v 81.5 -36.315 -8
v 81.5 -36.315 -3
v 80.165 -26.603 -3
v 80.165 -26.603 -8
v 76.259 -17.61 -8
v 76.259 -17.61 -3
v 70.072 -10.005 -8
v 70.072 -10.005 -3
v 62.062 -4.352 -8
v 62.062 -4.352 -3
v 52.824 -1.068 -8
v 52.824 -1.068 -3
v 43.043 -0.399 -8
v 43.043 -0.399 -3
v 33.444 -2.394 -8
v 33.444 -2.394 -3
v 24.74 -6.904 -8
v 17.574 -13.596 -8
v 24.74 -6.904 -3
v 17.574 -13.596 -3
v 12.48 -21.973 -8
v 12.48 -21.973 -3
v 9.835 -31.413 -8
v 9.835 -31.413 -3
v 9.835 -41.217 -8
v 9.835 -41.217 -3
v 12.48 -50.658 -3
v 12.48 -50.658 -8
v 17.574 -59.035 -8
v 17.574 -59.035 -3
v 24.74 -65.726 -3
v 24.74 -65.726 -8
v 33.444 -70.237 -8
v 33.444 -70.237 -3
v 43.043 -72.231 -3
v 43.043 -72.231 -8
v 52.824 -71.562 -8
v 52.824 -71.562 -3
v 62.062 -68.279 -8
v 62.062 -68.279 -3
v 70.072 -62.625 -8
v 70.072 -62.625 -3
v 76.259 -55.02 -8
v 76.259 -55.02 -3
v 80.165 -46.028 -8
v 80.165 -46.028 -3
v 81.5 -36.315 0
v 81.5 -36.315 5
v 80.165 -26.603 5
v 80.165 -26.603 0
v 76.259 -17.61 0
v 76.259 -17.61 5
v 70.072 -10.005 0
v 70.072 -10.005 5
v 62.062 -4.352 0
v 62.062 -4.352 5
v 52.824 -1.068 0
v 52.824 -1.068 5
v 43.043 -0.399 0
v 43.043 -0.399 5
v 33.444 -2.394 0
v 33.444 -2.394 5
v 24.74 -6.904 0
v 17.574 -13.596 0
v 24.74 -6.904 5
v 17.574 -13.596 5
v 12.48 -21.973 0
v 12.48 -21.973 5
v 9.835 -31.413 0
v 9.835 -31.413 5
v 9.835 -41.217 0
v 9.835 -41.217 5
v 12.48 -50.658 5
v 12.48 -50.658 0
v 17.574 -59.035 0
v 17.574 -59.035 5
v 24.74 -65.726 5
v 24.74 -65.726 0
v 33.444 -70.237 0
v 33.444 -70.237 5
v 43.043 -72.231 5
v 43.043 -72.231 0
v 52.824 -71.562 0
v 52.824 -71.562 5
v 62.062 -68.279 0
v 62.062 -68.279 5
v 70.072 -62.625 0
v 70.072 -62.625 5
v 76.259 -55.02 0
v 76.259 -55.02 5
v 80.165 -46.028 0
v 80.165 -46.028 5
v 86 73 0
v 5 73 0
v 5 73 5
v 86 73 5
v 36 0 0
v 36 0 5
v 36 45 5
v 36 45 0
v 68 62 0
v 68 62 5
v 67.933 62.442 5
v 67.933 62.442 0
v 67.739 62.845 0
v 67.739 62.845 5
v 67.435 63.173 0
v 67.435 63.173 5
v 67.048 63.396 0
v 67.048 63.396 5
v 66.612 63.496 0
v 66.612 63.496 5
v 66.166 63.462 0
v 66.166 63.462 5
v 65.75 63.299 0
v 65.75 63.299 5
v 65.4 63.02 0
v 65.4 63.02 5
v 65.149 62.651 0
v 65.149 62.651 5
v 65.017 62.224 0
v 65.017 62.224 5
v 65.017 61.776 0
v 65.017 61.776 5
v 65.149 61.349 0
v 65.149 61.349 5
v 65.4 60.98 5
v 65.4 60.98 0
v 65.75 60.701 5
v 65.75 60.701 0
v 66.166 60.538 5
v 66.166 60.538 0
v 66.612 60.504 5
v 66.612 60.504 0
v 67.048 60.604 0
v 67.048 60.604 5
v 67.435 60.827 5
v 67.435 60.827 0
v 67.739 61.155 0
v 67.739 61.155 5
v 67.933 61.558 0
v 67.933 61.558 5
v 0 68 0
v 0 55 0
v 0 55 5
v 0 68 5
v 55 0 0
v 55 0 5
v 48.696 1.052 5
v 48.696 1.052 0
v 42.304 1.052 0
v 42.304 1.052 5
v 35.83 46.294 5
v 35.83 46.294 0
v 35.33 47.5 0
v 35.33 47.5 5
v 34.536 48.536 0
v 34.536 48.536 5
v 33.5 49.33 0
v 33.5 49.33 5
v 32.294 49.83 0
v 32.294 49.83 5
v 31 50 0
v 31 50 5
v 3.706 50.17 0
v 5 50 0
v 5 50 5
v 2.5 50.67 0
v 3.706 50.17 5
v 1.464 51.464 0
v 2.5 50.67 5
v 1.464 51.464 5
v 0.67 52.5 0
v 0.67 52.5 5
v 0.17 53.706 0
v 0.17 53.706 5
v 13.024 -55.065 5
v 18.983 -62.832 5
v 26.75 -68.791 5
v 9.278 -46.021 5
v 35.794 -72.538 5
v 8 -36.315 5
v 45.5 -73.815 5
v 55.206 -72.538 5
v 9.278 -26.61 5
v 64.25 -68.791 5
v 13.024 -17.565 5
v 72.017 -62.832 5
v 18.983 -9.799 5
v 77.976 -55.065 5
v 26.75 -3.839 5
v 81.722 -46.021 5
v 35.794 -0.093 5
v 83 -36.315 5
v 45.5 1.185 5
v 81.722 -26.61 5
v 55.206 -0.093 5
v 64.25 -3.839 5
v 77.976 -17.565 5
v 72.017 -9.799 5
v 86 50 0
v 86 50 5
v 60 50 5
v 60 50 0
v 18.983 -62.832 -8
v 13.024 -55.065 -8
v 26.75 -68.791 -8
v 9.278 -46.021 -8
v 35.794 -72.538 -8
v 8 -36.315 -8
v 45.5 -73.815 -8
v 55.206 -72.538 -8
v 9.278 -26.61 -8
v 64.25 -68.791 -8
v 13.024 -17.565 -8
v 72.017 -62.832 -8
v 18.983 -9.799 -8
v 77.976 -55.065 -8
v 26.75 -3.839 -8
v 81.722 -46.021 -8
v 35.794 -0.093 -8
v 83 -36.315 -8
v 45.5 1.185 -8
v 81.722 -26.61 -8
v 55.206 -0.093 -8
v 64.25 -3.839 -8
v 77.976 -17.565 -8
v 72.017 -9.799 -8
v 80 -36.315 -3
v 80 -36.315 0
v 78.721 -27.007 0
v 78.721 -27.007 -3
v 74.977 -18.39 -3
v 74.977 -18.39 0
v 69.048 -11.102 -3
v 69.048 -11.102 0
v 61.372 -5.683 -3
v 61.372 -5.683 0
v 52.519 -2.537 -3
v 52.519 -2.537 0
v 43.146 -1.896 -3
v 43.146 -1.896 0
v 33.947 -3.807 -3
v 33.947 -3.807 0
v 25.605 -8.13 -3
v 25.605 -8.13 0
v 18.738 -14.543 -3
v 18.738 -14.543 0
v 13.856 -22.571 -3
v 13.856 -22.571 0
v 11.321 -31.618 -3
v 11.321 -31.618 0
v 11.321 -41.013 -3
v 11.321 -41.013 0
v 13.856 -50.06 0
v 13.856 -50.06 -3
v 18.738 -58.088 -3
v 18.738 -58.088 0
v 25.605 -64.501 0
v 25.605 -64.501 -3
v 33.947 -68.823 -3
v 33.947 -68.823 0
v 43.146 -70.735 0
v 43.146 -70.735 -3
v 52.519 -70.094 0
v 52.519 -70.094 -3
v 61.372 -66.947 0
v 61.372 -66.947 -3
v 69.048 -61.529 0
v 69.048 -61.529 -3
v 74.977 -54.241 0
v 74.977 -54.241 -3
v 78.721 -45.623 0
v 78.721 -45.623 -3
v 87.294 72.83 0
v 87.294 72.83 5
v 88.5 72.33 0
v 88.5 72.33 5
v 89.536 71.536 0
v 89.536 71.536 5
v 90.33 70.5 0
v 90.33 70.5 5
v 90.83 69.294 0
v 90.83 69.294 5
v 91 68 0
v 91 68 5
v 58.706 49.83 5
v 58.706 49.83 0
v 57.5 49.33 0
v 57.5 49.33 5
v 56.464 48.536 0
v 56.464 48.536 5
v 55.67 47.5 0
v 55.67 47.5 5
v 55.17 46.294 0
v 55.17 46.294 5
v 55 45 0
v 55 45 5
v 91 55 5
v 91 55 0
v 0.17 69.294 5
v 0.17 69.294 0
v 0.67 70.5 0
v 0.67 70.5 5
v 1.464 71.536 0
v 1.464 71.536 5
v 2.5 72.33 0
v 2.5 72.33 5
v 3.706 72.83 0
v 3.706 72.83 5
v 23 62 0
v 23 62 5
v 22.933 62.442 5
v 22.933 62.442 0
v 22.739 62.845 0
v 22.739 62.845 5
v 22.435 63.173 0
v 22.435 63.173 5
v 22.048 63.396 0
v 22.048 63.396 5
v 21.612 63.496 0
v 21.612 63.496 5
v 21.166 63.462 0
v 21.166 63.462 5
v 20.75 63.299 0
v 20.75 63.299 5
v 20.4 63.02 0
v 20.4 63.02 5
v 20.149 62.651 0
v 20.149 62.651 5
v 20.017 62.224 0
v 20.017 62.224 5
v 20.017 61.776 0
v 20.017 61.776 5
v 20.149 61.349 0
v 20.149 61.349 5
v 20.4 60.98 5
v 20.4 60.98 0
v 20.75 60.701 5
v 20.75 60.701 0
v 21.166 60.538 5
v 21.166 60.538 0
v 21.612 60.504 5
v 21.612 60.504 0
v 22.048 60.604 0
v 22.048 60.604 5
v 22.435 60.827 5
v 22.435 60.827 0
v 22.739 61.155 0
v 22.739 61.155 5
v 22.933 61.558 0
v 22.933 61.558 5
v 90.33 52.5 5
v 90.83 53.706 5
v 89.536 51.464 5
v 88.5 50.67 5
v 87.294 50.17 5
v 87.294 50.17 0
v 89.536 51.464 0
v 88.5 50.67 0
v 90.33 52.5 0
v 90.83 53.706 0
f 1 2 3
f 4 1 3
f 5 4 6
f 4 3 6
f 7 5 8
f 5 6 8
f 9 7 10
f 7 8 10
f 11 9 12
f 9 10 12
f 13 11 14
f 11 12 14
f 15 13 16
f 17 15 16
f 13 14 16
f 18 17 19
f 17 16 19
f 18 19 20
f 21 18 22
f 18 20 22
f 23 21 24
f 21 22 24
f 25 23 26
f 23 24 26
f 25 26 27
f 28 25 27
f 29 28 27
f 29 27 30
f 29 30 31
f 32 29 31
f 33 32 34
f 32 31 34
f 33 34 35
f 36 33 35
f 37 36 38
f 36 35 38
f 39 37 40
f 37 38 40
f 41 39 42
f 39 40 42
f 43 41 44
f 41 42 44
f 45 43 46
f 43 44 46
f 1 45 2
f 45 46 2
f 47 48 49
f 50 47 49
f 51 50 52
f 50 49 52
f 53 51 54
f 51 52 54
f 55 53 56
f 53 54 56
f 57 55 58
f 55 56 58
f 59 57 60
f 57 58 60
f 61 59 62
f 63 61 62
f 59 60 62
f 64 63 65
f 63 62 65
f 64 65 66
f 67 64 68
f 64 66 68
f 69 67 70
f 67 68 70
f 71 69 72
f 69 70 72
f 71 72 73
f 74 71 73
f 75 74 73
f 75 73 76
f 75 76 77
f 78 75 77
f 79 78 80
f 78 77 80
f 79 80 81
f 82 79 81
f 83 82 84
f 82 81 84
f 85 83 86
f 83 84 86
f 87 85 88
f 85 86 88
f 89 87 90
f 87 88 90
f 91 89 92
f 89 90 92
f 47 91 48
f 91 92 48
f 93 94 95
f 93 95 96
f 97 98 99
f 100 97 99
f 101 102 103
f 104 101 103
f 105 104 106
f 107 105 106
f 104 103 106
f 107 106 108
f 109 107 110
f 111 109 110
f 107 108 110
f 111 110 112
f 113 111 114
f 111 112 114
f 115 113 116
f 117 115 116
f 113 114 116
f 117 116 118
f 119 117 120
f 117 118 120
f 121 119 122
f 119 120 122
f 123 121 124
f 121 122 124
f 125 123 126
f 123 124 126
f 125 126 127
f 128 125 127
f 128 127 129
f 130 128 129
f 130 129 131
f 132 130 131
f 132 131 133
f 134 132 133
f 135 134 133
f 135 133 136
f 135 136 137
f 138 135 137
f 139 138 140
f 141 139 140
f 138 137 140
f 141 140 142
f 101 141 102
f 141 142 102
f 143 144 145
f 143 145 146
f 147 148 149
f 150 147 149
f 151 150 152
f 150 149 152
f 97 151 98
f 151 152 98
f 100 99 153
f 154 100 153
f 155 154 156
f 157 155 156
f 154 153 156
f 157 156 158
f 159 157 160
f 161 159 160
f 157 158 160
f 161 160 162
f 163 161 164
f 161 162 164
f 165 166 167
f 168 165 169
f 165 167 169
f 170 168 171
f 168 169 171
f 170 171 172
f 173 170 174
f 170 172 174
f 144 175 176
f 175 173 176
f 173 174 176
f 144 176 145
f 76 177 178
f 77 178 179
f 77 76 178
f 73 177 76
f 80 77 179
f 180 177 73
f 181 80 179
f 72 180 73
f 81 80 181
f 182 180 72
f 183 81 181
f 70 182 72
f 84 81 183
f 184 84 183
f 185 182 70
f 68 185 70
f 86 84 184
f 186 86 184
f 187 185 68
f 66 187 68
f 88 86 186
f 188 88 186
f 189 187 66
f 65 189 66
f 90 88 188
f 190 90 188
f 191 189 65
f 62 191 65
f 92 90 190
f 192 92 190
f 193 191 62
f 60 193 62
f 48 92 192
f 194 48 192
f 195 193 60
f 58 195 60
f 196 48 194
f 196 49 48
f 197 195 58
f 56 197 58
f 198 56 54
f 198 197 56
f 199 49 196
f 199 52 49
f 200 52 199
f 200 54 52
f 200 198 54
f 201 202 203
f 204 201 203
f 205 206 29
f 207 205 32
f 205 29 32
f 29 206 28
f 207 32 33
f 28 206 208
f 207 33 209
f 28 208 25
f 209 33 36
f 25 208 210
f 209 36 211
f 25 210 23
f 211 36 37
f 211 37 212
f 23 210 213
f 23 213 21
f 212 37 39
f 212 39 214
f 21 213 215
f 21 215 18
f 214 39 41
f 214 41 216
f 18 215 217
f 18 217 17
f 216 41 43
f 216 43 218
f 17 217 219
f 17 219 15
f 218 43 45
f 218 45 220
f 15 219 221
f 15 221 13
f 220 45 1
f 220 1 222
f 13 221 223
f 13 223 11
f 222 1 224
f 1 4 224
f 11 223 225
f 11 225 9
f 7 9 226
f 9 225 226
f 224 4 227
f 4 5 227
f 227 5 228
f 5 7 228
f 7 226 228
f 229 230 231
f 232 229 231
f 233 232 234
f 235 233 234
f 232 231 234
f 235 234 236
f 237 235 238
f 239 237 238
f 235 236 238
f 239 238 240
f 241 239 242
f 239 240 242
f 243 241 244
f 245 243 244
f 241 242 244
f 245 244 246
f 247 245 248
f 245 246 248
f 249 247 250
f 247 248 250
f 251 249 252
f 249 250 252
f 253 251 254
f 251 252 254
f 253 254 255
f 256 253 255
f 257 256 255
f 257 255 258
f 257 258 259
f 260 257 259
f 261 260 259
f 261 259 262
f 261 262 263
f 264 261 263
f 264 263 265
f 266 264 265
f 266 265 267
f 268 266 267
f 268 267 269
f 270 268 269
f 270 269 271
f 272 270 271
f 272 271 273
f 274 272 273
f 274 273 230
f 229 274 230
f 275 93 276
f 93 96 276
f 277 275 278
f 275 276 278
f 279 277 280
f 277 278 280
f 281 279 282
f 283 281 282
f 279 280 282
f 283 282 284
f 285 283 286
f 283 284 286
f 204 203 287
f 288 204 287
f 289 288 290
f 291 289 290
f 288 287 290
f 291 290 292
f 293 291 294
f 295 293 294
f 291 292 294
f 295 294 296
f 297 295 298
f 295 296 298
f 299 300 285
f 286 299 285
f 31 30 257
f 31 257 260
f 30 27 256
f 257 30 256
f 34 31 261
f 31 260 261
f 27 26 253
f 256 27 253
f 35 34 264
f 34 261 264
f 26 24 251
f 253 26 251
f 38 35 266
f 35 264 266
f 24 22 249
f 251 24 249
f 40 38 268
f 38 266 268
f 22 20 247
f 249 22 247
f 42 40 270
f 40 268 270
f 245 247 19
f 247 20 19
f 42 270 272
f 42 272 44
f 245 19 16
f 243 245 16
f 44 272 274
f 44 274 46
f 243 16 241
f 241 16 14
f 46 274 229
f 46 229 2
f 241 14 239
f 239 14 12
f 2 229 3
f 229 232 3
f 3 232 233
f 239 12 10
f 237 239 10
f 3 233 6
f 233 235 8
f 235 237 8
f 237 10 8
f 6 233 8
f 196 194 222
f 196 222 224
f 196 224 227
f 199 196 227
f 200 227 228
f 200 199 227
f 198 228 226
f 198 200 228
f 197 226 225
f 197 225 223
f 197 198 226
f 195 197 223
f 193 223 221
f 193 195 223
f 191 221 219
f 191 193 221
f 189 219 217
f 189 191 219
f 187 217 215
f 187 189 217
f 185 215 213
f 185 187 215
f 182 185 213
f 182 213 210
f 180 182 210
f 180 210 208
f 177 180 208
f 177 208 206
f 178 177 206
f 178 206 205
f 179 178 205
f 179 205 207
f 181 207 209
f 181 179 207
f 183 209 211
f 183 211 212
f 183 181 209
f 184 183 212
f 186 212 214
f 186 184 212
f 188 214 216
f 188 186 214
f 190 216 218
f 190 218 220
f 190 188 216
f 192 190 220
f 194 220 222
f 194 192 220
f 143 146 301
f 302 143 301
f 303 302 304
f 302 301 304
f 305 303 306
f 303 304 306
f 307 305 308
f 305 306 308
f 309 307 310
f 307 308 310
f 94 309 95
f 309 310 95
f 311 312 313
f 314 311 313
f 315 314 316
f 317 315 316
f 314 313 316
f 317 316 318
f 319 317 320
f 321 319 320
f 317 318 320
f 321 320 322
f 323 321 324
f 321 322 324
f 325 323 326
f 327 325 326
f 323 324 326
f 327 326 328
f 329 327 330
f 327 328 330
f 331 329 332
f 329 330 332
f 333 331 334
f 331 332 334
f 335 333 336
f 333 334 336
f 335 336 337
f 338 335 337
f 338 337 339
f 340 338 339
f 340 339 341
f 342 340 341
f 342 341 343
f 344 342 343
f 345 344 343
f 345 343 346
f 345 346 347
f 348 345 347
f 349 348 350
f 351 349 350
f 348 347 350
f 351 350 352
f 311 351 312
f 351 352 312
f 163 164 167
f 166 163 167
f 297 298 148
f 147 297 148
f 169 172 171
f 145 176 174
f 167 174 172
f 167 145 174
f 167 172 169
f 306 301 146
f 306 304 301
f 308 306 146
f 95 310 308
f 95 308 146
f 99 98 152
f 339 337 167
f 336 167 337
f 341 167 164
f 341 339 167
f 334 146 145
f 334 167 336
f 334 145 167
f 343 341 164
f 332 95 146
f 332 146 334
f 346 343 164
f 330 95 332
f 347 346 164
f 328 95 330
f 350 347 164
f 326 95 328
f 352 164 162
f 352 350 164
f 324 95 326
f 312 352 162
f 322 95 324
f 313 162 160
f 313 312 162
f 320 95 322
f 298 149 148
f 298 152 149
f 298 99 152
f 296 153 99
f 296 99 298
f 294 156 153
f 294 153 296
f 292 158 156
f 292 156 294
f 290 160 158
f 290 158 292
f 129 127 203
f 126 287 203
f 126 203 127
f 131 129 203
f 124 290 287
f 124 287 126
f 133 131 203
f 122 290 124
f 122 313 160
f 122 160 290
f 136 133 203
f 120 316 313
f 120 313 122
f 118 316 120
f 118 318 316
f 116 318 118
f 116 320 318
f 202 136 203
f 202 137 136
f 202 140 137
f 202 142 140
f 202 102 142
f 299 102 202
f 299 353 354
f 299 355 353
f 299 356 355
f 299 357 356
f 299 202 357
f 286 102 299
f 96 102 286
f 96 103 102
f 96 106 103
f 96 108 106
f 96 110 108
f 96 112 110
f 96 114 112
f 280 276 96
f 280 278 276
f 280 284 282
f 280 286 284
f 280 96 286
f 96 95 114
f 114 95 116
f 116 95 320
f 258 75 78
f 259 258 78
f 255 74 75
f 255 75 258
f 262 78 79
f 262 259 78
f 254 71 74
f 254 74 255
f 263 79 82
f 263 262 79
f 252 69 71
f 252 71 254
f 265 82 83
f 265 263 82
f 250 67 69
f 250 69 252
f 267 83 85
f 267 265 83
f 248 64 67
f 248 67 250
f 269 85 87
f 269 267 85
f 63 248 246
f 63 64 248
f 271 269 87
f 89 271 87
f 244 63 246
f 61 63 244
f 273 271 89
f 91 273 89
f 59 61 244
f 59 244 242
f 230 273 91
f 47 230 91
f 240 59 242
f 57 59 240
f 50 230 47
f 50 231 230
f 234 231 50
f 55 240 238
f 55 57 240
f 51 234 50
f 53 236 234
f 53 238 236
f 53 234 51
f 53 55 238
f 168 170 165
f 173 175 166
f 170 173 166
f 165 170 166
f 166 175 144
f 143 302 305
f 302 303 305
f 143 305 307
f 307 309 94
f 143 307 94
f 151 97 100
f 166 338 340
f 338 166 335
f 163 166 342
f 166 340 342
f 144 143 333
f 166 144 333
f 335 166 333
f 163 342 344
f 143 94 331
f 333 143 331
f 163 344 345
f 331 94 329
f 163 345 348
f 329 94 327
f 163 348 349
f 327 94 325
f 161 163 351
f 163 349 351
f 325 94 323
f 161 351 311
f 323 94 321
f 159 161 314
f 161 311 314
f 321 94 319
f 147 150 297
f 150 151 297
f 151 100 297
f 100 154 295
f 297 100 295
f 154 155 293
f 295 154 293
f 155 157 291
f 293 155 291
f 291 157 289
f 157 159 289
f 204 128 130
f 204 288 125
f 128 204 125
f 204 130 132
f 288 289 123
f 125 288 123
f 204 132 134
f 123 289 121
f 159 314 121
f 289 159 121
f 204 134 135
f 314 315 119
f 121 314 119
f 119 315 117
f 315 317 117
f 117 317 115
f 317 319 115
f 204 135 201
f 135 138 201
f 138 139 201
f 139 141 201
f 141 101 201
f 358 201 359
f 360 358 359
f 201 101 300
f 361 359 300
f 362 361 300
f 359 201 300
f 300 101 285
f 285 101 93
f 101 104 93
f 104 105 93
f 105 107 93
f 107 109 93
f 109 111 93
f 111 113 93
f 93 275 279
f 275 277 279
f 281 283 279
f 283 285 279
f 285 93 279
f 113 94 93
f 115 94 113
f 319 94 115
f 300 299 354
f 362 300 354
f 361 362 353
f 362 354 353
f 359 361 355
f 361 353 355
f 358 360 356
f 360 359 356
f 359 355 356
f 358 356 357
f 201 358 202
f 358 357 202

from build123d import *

# Parameters (mm, degrees)
ESQUISSE1_W                = 91
ESQUISSE1_H                = 73
BOSS_EXTRU_1_DEPTH         = 5
ENL_V_MAT_EXTRU_2_DEPTH    = 10
ENL_V_MAT_EXTRU_3_DEPTH    = 10
ESQUISSE4_R                = 37.5
BOSS_EXTRU_2_DEPTH         = 13
ESQUISSE5_R                = 36
ENL_V_MAT_EXTRU_4_DEPTH    = 5
R_P_TITION_LIN_AIRE1_COUNT = 2
R_P_TITION_LIN_AIRE1_PITCH = 8
ESQUISSE6_R                = 34.5
ENL_V_MAT_EXTRU_5_DEPTH    = 5
ENL_V_MAT_EXTRU_6_DEPTH    = 5
CONG_1_R                   = 5
ESQUISSE8_R                = 1.5
ENL_V_MAT_EXTRU_7_DEPTH    = 5


with BuildPart() as part:
    # Esquisse1 → Boss.-Extru.1 (new body)
    with BuildSketch(Plane.XY):
        with Locations((45.5, 36.5)):
            Rectangle(ESQUISSE1_W, ESQUISSE1_H)
    extrude(amount=BOSS_EXTRU_1_DEPTH)

    # Esquisse2 → Enlèv. mat.-Extru.2 (cut)
    with BuildSketch(Plane.XY.offset(5)):
        with BuildLine():
            Line((0, 0), (36, 0))
            Line((36, 0), (36, 45))
            ThreePointArc((36, 45), (34.535533906, 48.535533906), (31, 50))
            Line((31, 50), (5, 50))
            ThreePointArc((5, 50), (1.464466094, 51.464466094), (0, 55))
            Line((0, 55), (0, 50))
            Line((0, 50), (0, 0))
        make_face()
        with BuildLine():
            Line((86, 50), (60, 50))
            ThreePointArc((60, 50), (56.464466094, 48.535533906), (55, 45))
            Line((55, 45), (55, 0))
            Line((55, 0), (91, 0))
            Line((91, 0), (91, 50))
            Line((91, 50), (91, 55))
            ThreePointArc((91, 55), (89.535533906, 51.464466094), (86, 50))
        make_face()
    extrude(amount=-ENL_V_MAT_EXTRU_2_DEPTH, mode=Mode.SUBTRACT)

    # Esquisse3 → Enlèv. mat.-Extru.3 (cut)
    with BuildSketch(Plane.XY.offset(5)):
        with BuildLine():
            Line((36, 0), (55, 0))
            ThreePointArc((55, 0), (45.5, 1.184622268), (36, 0))
        make_face()
    extrude(amount=-ENL_V_MAT_EXTRU_3_DEPTH, mode=Mode.SUBTRACT)

    # Esquisse7 → Enlèv. mat.-Extru.6 (cut)
    with BuildSketch(Plane.XY.offset(5)):
        with BuildLine():
            ThreePointArc((0, 68), (1.464466094, 71.535533906), (5, 73))
            Line((5, 73), (0, 73))
            Line((0, 73), (0, 68))
        make_face()
    extrude(amount=-ENL_V_MAT_EXTRU_6_DEPTH, mode=Mode.SUBTRACT)

    # Congé1
    cong_1_edges = [part.edges().sort_by_distance(p)[0] for p in [
        (91, 73, 2.5),
    ]]
    fillet(cong_1_edges, radius=CONG_1_R)

    # Esquisse8 → Enlèv. mat.-Extru.7 (cut)
    with BuildSketch(Plane.XY.offset(5)):
        with Locations((21.5, 62)):
            Circle(ESQUISSE8_R)
        with Locations((66.5, 62)):
            Circle(ESQUISSE8_R)
    extrude(amount=-ENL_V_MAT_EXTRU_7_DEPTH, mode=Mode.SUBTRACT)


with BuildPart() as body_2:
    # Esquisse4 → Boss.-Extru.2 (new body)
    with BuildSketch(Plane.XY.offset(5)):
        with Locations((45.5, -36.315377732)):
            Circle(ESQUISSE4_R)
    extrude(amount=-BOSS_EXTRU_2_DEPTH)

    # Esquisse5 → Enlèv. mat.-Extru.4 (cut)
    with BuildSketch(Plane.XY.offset(5)):
        with Locations((45.5, -36.315377732)):
            Circle(ESQUISSE5_R)
    enl_v_mat_extru_4 = extrude(amount=-ENL_V_MAT_EXTRU_4_DEPTH, mode=Mode.SUBTRACT)

    # Répétition linéaire1: Enlèv. mat.-Extru.4 ×2
    with Locations(*[(0, 0, -i * R_P_TITION_LIN_AIRE1_PITCH) for i in range(1, R_P_TITION_LIN_AIRE1_COUNT)]):
        add(enl_v_mat_extru_4, mode=Mode.SUBTRACT)

    # Esquisse6 → Enlèv. mat.-Extru.5 (cut)
    with BuildSketch(Plane.XY):
        with Locations((45.5, -36.315377732)):
            Circle(ESQUISSE6_R)
    extrude(amount=-ENL_V_MAT_EXTRU_5_DEPTH, mode=Mode.SUBTRACT)


solid = Compound([part.part, body_2.part])
